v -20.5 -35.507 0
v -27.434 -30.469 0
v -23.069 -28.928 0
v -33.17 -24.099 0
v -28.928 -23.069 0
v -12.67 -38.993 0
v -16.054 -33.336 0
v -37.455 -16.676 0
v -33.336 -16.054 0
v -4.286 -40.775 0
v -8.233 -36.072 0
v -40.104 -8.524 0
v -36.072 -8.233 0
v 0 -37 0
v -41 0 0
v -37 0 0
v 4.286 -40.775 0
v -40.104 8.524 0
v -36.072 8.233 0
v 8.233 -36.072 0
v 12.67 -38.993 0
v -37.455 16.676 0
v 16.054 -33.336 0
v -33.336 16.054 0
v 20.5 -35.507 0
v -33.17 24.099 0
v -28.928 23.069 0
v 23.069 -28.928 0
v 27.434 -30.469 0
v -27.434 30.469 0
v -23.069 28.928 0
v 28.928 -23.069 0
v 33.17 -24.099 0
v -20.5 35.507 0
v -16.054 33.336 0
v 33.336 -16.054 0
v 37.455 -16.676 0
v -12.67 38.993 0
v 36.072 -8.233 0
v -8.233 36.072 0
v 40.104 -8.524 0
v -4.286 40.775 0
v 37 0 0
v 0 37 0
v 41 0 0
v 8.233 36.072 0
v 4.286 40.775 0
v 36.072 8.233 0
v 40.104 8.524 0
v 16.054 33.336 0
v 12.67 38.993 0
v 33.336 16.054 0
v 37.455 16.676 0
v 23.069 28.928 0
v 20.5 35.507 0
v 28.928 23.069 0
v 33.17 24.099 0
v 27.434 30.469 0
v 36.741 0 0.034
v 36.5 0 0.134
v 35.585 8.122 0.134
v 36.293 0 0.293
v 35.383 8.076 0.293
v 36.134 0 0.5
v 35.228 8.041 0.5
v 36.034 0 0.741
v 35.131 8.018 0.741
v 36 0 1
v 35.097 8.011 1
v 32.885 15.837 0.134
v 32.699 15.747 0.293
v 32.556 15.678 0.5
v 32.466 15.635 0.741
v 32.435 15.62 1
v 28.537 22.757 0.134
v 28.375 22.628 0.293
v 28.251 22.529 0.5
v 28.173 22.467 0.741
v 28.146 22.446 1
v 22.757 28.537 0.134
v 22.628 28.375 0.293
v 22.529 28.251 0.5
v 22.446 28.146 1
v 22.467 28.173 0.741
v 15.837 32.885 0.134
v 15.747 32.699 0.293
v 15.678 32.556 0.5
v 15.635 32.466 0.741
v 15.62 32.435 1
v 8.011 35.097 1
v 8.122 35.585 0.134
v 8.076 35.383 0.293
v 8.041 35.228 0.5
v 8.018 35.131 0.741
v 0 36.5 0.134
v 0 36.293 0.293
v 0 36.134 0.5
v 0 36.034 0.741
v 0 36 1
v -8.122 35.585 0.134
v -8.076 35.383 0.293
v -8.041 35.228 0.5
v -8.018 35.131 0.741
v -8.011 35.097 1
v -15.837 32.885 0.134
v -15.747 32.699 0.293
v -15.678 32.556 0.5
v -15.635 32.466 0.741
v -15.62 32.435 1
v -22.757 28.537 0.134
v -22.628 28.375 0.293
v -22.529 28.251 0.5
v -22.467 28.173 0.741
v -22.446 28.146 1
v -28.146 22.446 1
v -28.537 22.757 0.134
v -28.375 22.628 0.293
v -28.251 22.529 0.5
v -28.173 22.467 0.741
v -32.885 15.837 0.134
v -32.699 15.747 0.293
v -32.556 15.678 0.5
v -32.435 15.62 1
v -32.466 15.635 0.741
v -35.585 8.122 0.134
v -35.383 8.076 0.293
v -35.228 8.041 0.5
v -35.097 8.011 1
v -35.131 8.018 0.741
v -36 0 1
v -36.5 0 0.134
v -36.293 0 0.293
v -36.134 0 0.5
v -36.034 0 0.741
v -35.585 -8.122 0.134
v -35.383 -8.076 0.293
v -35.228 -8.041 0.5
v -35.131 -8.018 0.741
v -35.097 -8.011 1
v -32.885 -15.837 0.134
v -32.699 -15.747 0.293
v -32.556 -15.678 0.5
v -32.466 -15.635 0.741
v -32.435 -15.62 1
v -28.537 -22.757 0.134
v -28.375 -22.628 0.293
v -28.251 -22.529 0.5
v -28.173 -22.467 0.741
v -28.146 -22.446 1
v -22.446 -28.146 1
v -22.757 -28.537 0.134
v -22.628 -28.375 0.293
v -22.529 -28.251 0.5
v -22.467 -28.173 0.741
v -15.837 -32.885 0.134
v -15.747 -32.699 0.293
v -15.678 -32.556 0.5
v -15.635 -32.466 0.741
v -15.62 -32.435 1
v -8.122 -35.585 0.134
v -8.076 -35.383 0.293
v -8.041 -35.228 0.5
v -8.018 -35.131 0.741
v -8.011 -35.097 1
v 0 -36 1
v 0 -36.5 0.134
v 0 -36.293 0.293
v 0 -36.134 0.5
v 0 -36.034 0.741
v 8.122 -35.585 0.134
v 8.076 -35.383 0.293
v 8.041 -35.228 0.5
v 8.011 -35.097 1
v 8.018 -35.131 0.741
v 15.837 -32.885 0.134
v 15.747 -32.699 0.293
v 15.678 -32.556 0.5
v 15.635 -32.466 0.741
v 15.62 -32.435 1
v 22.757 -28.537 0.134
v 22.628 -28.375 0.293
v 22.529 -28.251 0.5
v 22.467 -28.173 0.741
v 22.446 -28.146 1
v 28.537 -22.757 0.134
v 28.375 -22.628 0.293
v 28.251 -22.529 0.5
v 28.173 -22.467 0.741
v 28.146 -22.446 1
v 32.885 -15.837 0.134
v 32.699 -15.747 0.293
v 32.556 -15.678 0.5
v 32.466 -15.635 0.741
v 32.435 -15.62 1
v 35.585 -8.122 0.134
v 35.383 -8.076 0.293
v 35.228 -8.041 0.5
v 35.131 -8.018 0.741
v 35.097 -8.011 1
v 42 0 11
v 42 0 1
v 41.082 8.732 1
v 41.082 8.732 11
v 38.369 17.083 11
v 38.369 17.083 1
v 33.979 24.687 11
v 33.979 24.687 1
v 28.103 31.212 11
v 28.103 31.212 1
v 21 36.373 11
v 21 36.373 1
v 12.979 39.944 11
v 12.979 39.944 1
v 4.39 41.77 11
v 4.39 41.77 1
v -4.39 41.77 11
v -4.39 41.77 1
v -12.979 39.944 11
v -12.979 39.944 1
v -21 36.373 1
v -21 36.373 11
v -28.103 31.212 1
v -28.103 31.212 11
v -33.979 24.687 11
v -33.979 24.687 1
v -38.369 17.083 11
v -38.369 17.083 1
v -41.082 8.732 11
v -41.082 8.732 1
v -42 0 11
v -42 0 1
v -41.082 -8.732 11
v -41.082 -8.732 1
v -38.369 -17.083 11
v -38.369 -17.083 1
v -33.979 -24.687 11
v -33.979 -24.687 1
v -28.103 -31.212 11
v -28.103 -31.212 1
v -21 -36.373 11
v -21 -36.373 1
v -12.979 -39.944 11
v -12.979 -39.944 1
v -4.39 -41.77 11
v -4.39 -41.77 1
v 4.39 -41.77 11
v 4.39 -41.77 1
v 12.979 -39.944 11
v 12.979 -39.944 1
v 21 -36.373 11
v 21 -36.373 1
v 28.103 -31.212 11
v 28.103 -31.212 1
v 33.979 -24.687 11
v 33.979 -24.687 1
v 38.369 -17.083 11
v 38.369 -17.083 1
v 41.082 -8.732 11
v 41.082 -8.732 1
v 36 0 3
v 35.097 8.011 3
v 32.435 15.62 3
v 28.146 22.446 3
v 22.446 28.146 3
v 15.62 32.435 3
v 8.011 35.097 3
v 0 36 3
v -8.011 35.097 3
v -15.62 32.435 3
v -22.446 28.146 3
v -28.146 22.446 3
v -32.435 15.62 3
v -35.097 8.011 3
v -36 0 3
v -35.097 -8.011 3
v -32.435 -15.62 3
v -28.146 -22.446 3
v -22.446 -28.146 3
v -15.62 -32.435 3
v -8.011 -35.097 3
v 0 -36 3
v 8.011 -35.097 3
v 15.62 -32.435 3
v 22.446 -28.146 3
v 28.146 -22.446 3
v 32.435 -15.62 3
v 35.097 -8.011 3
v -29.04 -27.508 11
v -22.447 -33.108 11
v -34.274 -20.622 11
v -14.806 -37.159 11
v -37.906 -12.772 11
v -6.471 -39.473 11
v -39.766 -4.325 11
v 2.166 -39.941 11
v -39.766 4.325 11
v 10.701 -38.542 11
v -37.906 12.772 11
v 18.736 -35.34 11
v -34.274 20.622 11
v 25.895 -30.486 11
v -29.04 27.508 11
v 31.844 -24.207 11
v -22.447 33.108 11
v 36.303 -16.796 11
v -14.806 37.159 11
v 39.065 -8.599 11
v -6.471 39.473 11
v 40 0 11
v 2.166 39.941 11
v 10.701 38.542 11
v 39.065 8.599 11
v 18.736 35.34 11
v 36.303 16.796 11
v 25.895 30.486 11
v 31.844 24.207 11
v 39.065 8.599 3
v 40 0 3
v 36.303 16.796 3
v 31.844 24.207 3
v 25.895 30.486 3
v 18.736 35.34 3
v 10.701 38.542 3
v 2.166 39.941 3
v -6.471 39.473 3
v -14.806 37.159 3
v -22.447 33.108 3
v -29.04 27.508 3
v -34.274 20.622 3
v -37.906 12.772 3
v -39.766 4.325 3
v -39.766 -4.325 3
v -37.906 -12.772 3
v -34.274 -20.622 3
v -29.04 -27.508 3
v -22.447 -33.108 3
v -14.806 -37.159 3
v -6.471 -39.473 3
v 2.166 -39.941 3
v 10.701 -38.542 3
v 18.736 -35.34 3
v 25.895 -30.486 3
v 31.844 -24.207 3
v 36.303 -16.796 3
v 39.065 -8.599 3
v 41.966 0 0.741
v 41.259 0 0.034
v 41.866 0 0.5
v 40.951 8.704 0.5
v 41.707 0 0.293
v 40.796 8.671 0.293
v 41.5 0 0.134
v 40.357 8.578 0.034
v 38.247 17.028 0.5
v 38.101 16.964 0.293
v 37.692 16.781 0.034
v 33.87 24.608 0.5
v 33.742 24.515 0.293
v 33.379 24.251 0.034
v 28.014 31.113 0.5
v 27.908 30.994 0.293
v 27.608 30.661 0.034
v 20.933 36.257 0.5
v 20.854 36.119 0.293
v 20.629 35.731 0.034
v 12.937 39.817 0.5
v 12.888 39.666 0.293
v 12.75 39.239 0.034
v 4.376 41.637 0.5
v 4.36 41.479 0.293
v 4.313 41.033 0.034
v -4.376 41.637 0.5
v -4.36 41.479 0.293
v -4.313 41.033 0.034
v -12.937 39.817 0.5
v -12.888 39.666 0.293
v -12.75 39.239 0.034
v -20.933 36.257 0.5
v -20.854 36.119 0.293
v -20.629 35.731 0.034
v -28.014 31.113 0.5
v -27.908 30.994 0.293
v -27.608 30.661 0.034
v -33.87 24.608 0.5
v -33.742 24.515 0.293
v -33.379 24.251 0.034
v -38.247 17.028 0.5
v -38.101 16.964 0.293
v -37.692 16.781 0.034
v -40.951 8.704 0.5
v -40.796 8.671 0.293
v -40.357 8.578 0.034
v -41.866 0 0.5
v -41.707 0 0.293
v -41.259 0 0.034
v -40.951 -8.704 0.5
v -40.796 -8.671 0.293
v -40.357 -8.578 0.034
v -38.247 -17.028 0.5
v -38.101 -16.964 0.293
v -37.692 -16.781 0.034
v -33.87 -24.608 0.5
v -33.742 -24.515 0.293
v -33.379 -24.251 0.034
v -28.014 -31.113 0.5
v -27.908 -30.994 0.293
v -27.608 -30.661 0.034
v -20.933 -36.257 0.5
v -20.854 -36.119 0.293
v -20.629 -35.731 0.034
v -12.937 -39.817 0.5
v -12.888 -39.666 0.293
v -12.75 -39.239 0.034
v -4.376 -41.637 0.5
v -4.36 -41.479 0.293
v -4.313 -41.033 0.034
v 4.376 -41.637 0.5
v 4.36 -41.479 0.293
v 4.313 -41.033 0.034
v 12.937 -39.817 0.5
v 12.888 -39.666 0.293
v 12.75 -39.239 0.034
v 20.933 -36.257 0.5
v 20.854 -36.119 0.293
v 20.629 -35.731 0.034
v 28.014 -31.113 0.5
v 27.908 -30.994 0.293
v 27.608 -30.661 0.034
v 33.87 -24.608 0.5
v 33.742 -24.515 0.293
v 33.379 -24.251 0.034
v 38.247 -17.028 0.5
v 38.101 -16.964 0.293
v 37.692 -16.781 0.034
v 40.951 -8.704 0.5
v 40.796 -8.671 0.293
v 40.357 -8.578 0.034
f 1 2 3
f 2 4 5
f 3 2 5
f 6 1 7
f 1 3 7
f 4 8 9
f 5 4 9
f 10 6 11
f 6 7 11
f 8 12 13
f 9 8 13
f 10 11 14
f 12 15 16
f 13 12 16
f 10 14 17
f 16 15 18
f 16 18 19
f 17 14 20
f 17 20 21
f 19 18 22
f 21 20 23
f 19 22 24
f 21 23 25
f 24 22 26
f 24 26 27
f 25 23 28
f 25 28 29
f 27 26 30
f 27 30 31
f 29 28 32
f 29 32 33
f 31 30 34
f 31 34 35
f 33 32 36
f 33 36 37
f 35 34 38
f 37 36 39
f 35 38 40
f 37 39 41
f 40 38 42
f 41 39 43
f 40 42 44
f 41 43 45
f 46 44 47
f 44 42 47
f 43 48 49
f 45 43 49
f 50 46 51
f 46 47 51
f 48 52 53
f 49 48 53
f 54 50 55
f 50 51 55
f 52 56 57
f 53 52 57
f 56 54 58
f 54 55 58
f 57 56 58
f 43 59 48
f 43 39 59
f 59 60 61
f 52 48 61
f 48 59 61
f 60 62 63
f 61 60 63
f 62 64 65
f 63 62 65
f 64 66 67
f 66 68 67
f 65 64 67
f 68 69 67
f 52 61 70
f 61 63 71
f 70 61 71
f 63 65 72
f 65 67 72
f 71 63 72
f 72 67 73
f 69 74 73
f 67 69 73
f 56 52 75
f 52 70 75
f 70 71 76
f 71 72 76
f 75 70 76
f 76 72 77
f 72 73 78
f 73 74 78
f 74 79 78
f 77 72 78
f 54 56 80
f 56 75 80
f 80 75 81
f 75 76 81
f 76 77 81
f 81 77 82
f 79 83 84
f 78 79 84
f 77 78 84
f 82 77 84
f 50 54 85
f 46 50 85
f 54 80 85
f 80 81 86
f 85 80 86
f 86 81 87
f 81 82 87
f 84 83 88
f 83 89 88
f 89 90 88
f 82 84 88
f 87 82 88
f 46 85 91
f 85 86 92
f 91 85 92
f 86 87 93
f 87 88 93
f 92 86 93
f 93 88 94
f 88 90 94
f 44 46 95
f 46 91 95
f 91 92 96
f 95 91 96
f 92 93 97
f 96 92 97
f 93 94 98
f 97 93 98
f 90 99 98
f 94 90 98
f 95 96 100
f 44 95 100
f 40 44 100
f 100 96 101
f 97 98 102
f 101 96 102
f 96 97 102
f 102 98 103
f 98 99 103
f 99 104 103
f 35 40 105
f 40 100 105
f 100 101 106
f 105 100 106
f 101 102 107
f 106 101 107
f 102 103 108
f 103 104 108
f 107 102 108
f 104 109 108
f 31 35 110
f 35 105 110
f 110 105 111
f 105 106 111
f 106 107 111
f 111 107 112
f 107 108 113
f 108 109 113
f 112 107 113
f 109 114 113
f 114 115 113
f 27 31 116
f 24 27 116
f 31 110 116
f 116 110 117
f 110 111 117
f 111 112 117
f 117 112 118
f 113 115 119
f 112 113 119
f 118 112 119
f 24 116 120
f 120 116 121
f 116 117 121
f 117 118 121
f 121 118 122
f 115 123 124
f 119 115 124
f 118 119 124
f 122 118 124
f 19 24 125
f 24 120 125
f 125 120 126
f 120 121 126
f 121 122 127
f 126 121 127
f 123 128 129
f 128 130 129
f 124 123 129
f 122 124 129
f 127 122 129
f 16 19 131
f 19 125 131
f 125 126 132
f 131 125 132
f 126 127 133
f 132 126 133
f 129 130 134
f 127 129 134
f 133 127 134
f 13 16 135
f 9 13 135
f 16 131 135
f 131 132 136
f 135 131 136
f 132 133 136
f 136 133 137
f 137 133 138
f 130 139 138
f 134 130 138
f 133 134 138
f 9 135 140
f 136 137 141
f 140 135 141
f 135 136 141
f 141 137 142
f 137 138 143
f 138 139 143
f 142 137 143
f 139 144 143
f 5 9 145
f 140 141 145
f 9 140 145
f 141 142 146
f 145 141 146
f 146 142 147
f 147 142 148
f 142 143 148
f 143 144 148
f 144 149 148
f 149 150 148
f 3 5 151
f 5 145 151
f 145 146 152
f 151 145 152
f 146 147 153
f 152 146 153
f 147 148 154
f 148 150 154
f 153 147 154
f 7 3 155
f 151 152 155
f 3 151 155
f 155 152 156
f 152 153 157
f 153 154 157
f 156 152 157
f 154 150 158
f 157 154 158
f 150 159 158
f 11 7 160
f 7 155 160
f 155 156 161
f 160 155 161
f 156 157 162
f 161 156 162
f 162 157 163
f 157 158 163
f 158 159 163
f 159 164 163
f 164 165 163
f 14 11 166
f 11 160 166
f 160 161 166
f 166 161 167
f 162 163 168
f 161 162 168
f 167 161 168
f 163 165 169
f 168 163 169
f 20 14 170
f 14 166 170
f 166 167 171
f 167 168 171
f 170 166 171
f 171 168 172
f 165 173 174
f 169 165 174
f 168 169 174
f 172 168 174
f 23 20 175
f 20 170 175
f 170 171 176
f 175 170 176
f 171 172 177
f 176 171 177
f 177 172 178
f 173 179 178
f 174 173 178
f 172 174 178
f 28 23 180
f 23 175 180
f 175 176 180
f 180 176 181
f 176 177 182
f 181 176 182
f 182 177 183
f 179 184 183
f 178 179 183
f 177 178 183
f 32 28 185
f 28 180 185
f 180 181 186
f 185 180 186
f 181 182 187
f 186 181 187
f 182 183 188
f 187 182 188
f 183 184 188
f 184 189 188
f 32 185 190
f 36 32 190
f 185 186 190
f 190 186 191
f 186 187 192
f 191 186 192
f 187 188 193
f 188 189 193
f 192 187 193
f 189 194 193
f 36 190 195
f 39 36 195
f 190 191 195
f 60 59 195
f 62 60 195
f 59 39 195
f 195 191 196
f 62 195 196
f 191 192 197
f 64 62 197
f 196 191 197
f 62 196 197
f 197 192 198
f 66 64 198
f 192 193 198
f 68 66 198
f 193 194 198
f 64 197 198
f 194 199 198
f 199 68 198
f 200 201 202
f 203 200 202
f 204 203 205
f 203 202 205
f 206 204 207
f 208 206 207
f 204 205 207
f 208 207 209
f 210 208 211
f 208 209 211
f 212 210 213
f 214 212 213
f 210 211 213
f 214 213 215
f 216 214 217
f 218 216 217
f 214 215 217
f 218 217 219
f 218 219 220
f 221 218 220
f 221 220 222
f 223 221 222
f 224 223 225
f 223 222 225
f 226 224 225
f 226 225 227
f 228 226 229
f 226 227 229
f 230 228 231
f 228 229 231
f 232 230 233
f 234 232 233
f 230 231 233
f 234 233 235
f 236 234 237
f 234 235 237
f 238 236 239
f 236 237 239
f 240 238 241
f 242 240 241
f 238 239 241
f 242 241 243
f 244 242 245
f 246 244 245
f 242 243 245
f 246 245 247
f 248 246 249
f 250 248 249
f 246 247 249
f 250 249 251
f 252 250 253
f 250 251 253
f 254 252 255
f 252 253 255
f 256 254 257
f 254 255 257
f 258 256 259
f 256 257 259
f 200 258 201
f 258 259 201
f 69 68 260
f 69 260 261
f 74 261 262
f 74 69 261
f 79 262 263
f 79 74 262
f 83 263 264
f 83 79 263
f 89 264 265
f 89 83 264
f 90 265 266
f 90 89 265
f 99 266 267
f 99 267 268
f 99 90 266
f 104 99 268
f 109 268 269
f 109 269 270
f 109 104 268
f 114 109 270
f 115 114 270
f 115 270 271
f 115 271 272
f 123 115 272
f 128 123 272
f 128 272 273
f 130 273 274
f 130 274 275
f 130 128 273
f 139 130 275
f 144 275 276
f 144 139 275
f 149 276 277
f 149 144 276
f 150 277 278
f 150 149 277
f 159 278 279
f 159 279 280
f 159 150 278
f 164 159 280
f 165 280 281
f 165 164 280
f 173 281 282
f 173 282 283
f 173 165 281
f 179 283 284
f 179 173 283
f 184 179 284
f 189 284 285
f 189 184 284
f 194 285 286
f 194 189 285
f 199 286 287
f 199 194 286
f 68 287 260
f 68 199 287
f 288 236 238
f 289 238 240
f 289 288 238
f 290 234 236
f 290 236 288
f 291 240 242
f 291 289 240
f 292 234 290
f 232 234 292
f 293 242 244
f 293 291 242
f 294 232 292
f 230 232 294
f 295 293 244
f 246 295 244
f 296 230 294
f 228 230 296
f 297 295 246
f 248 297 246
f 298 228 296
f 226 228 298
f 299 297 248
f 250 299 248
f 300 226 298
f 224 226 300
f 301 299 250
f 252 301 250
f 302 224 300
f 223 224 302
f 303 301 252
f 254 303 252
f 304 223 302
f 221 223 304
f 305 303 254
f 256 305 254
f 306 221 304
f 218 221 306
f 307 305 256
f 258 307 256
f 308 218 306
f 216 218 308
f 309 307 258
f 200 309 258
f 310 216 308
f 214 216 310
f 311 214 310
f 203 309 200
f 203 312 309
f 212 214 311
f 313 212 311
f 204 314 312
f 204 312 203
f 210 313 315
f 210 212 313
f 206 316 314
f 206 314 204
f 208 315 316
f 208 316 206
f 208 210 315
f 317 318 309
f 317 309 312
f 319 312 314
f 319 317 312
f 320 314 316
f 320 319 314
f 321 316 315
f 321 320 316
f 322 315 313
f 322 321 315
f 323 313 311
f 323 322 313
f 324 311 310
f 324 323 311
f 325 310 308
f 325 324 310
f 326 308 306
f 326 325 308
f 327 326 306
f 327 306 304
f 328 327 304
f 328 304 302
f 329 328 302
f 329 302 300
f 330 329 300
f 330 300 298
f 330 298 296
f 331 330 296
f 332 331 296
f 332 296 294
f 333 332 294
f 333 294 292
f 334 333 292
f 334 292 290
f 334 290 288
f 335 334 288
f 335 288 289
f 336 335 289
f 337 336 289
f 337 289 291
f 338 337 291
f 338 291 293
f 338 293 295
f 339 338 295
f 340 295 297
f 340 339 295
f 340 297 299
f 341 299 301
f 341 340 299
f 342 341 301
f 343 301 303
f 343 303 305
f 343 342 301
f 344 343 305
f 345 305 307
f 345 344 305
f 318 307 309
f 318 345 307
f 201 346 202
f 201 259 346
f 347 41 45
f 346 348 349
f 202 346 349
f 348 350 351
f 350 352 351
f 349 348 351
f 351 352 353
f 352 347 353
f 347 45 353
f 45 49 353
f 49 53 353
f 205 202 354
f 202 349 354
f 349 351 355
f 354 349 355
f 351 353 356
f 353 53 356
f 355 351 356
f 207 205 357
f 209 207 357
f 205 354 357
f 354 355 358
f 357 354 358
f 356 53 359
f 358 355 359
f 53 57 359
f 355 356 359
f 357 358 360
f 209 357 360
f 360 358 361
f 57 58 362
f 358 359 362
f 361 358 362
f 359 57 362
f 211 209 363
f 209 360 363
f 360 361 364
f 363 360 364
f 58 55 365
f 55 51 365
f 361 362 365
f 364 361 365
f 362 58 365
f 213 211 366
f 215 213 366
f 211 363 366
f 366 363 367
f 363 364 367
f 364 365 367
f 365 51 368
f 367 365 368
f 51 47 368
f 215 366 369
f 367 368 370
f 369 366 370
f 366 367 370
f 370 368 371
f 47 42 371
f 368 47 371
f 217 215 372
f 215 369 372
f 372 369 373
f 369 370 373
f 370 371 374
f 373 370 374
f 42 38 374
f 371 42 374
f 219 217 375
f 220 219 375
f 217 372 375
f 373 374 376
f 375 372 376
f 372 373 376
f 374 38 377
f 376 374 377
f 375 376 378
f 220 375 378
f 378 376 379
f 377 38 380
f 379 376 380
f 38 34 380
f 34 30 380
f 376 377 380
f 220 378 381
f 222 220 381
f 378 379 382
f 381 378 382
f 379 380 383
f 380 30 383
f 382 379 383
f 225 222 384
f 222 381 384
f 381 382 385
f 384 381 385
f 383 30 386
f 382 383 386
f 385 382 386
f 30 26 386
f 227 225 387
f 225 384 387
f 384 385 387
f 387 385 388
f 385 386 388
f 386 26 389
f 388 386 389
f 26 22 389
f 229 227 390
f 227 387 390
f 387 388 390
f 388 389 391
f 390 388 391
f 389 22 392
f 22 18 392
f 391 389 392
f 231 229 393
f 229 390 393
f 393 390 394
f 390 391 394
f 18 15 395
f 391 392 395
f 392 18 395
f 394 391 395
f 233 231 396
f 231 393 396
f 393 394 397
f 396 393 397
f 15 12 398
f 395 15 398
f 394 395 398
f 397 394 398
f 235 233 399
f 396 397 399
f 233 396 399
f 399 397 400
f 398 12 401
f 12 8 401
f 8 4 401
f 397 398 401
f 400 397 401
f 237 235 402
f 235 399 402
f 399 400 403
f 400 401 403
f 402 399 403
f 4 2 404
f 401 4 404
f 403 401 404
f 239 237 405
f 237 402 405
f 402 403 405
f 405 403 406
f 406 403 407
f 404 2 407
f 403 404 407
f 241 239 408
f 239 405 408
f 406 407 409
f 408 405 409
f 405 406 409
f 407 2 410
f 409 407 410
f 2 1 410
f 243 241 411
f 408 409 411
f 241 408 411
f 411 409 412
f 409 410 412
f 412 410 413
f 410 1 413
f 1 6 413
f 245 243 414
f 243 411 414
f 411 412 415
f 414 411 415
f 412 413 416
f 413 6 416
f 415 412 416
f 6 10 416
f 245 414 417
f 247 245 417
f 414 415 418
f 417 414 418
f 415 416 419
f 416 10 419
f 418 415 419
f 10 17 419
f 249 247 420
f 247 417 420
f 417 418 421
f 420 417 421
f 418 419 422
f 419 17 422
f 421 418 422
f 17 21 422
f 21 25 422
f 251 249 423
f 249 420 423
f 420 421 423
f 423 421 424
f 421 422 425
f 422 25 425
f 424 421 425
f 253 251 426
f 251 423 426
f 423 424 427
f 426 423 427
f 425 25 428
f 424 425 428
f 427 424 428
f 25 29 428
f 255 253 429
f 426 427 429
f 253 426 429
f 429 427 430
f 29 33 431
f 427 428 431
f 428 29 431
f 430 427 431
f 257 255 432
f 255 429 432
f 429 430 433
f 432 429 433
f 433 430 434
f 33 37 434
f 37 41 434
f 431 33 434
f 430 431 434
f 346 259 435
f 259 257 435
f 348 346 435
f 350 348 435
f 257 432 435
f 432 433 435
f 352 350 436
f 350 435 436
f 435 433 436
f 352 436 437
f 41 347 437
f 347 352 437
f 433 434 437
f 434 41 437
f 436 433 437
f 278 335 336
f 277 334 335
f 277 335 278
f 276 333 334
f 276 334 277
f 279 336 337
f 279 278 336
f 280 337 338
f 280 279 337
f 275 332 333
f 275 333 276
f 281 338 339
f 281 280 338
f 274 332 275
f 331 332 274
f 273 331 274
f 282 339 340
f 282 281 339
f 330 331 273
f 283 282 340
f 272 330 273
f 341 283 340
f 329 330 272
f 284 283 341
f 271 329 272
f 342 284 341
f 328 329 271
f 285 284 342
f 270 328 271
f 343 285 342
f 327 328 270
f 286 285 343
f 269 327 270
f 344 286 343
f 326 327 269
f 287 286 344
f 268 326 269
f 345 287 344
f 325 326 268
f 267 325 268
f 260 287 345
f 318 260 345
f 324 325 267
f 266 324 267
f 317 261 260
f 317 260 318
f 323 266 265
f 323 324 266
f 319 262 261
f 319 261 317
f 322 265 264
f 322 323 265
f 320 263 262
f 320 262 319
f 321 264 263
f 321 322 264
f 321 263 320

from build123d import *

# Parameters (mm, degrees)
F0_R     = 40
F0_R_2   = 36
F1_DEPTH = 3
F0_R_3   = 42
F2_DEPTH = 11
F3_R     = 1
F4_R     = 1


with BuildPart() as f1:
    # F0 (on Top) → F1 (new body)
    with BuildSketch(Plane.XY):
        Circle(F0_R)
        Circle(F0_R_2, mode=Mode.SUBTRACT)
    extrude(amount=F1_DEPTH)

    # F0 (on Top) → F2 (join)
    with BuildSketch(Plane.XY):
        Circle(F0_R_3)
        Circle(F0_R, mode=Mode.SUBTRACT)
    extrude(amount=F2_DEPTH)

    # F3
    f3_edges = [f1.edges().sort_by_distance(p)[0] for p in [
        (-42, 0, 0),
    ]]
    fillet(f3_edges, radius=F3_R)

    # F4
    f4_edges = [f1.edges().sort_by_distance(p)[0] for p in [
        (-36, 0, 0),
    ]]
    fillet(f4_edges, radius=F4_R)


solid = f1.part
